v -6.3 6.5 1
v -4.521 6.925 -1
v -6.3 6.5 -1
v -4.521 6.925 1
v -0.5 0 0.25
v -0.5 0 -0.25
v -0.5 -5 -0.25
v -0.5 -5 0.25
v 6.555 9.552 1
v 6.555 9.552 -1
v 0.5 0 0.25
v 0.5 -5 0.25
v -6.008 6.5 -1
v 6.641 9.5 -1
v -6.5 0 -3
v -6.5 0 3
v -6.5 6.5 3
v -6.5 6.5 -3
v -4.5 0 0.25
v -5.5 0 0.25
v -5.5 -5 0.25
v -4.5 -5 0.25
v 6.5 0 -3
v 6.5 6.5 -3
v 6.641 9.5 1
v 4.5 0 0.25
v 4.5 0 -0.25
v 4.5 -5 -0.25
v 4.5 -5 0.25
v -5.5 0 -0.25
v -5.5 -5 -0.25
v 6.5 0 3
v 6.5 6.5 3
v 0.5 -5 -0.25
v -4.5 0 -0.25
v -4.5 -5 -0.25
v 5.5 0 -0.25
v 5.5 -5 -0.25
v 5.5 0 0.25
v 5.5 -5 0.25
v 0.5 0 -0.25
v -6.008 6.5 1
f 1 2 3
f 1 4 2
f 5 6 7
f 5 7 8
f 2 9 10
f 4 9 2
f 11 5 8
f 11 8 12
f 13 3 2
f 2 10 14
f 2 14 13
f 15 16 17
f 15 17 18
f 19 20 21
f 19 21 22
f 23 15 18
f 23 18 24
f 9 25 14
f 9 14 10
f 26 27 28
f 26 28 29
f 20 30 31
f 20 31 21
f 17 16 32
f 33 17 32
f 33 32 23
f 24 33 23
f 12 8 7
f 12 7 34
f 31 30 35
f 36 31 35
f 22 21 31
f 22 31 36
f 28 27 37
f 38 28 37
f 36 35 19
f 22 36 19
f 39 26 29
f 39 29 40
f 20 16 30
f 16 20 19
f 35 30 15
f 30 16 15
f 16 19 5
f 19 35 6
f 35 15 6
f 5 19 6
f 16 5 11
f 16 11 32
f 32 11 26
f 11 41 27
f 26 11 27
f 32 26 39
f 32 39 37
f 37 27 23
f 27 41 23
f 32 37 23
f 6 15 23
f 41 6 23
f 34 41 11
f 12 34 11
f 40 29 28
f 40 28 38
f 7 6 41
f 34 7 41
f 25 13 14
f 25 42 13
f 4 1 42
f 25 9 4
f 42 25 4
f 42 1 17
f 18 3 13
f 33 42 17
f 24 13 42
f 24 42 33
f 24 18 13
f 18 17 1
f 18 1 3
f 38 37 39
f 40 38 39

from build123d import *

# Parameters (mm, degrees)
ESQUISSE1_W        = 13
ESQUISSE1_H        = 6
BOSS_EXTRU_1_DEPTH = 6.5
ESQUISSE2_W        = 1
ESQUISSE2_H        = 0.5
BOSS_EXTRU_2_DEPTH = 5
BOSS_EXTRU_3_DEPTH = 1


with BuildPart() as part:
    # Esquisse1 → Boss.-Extru.1 (new body)
    with BuildSketch(Plane(origin=(0, 0, 0), x_dir=(1, 0, 0), z_dir=(0, 1, 0))):
        Rectangle(ESQUISSE1_W, ESQUISSE1_H)
    extrude(amount=BOSS_EXTRU_1_DEPTH)

    # Esquisse2 → Boss.-Extru.2 (add)
    with BuildSketch(Plane.XZ):
        with Locations((-5, 0)):
            Rectangle(ESQUISSE2_W, ESQUISSE2_H)
        Rectangle(ESQUISSE2_W, ESQUISSE2_H)
        with Locations((5, 0)):
            Rectangle(ESQUISSE2_W, ESQUISSE2_H)
    extrude(amount=BOSS_EXTRU_2_DEPTH)

    # Esquisse3 → Boss.-Extru.3 (add, symmetric)
    with BuildSketch(Plane.XY):
        Polygon((-6.00813505, 6.5), (6.640975591, 9.5), (6.555428051, 9.551784345), (-4.520695815, 6.924850916), (-6.3, 6.5), align=None)
    extrude(amount=BOSS_EXTRU_3_DEPTH, both=True)


solid = part.part
